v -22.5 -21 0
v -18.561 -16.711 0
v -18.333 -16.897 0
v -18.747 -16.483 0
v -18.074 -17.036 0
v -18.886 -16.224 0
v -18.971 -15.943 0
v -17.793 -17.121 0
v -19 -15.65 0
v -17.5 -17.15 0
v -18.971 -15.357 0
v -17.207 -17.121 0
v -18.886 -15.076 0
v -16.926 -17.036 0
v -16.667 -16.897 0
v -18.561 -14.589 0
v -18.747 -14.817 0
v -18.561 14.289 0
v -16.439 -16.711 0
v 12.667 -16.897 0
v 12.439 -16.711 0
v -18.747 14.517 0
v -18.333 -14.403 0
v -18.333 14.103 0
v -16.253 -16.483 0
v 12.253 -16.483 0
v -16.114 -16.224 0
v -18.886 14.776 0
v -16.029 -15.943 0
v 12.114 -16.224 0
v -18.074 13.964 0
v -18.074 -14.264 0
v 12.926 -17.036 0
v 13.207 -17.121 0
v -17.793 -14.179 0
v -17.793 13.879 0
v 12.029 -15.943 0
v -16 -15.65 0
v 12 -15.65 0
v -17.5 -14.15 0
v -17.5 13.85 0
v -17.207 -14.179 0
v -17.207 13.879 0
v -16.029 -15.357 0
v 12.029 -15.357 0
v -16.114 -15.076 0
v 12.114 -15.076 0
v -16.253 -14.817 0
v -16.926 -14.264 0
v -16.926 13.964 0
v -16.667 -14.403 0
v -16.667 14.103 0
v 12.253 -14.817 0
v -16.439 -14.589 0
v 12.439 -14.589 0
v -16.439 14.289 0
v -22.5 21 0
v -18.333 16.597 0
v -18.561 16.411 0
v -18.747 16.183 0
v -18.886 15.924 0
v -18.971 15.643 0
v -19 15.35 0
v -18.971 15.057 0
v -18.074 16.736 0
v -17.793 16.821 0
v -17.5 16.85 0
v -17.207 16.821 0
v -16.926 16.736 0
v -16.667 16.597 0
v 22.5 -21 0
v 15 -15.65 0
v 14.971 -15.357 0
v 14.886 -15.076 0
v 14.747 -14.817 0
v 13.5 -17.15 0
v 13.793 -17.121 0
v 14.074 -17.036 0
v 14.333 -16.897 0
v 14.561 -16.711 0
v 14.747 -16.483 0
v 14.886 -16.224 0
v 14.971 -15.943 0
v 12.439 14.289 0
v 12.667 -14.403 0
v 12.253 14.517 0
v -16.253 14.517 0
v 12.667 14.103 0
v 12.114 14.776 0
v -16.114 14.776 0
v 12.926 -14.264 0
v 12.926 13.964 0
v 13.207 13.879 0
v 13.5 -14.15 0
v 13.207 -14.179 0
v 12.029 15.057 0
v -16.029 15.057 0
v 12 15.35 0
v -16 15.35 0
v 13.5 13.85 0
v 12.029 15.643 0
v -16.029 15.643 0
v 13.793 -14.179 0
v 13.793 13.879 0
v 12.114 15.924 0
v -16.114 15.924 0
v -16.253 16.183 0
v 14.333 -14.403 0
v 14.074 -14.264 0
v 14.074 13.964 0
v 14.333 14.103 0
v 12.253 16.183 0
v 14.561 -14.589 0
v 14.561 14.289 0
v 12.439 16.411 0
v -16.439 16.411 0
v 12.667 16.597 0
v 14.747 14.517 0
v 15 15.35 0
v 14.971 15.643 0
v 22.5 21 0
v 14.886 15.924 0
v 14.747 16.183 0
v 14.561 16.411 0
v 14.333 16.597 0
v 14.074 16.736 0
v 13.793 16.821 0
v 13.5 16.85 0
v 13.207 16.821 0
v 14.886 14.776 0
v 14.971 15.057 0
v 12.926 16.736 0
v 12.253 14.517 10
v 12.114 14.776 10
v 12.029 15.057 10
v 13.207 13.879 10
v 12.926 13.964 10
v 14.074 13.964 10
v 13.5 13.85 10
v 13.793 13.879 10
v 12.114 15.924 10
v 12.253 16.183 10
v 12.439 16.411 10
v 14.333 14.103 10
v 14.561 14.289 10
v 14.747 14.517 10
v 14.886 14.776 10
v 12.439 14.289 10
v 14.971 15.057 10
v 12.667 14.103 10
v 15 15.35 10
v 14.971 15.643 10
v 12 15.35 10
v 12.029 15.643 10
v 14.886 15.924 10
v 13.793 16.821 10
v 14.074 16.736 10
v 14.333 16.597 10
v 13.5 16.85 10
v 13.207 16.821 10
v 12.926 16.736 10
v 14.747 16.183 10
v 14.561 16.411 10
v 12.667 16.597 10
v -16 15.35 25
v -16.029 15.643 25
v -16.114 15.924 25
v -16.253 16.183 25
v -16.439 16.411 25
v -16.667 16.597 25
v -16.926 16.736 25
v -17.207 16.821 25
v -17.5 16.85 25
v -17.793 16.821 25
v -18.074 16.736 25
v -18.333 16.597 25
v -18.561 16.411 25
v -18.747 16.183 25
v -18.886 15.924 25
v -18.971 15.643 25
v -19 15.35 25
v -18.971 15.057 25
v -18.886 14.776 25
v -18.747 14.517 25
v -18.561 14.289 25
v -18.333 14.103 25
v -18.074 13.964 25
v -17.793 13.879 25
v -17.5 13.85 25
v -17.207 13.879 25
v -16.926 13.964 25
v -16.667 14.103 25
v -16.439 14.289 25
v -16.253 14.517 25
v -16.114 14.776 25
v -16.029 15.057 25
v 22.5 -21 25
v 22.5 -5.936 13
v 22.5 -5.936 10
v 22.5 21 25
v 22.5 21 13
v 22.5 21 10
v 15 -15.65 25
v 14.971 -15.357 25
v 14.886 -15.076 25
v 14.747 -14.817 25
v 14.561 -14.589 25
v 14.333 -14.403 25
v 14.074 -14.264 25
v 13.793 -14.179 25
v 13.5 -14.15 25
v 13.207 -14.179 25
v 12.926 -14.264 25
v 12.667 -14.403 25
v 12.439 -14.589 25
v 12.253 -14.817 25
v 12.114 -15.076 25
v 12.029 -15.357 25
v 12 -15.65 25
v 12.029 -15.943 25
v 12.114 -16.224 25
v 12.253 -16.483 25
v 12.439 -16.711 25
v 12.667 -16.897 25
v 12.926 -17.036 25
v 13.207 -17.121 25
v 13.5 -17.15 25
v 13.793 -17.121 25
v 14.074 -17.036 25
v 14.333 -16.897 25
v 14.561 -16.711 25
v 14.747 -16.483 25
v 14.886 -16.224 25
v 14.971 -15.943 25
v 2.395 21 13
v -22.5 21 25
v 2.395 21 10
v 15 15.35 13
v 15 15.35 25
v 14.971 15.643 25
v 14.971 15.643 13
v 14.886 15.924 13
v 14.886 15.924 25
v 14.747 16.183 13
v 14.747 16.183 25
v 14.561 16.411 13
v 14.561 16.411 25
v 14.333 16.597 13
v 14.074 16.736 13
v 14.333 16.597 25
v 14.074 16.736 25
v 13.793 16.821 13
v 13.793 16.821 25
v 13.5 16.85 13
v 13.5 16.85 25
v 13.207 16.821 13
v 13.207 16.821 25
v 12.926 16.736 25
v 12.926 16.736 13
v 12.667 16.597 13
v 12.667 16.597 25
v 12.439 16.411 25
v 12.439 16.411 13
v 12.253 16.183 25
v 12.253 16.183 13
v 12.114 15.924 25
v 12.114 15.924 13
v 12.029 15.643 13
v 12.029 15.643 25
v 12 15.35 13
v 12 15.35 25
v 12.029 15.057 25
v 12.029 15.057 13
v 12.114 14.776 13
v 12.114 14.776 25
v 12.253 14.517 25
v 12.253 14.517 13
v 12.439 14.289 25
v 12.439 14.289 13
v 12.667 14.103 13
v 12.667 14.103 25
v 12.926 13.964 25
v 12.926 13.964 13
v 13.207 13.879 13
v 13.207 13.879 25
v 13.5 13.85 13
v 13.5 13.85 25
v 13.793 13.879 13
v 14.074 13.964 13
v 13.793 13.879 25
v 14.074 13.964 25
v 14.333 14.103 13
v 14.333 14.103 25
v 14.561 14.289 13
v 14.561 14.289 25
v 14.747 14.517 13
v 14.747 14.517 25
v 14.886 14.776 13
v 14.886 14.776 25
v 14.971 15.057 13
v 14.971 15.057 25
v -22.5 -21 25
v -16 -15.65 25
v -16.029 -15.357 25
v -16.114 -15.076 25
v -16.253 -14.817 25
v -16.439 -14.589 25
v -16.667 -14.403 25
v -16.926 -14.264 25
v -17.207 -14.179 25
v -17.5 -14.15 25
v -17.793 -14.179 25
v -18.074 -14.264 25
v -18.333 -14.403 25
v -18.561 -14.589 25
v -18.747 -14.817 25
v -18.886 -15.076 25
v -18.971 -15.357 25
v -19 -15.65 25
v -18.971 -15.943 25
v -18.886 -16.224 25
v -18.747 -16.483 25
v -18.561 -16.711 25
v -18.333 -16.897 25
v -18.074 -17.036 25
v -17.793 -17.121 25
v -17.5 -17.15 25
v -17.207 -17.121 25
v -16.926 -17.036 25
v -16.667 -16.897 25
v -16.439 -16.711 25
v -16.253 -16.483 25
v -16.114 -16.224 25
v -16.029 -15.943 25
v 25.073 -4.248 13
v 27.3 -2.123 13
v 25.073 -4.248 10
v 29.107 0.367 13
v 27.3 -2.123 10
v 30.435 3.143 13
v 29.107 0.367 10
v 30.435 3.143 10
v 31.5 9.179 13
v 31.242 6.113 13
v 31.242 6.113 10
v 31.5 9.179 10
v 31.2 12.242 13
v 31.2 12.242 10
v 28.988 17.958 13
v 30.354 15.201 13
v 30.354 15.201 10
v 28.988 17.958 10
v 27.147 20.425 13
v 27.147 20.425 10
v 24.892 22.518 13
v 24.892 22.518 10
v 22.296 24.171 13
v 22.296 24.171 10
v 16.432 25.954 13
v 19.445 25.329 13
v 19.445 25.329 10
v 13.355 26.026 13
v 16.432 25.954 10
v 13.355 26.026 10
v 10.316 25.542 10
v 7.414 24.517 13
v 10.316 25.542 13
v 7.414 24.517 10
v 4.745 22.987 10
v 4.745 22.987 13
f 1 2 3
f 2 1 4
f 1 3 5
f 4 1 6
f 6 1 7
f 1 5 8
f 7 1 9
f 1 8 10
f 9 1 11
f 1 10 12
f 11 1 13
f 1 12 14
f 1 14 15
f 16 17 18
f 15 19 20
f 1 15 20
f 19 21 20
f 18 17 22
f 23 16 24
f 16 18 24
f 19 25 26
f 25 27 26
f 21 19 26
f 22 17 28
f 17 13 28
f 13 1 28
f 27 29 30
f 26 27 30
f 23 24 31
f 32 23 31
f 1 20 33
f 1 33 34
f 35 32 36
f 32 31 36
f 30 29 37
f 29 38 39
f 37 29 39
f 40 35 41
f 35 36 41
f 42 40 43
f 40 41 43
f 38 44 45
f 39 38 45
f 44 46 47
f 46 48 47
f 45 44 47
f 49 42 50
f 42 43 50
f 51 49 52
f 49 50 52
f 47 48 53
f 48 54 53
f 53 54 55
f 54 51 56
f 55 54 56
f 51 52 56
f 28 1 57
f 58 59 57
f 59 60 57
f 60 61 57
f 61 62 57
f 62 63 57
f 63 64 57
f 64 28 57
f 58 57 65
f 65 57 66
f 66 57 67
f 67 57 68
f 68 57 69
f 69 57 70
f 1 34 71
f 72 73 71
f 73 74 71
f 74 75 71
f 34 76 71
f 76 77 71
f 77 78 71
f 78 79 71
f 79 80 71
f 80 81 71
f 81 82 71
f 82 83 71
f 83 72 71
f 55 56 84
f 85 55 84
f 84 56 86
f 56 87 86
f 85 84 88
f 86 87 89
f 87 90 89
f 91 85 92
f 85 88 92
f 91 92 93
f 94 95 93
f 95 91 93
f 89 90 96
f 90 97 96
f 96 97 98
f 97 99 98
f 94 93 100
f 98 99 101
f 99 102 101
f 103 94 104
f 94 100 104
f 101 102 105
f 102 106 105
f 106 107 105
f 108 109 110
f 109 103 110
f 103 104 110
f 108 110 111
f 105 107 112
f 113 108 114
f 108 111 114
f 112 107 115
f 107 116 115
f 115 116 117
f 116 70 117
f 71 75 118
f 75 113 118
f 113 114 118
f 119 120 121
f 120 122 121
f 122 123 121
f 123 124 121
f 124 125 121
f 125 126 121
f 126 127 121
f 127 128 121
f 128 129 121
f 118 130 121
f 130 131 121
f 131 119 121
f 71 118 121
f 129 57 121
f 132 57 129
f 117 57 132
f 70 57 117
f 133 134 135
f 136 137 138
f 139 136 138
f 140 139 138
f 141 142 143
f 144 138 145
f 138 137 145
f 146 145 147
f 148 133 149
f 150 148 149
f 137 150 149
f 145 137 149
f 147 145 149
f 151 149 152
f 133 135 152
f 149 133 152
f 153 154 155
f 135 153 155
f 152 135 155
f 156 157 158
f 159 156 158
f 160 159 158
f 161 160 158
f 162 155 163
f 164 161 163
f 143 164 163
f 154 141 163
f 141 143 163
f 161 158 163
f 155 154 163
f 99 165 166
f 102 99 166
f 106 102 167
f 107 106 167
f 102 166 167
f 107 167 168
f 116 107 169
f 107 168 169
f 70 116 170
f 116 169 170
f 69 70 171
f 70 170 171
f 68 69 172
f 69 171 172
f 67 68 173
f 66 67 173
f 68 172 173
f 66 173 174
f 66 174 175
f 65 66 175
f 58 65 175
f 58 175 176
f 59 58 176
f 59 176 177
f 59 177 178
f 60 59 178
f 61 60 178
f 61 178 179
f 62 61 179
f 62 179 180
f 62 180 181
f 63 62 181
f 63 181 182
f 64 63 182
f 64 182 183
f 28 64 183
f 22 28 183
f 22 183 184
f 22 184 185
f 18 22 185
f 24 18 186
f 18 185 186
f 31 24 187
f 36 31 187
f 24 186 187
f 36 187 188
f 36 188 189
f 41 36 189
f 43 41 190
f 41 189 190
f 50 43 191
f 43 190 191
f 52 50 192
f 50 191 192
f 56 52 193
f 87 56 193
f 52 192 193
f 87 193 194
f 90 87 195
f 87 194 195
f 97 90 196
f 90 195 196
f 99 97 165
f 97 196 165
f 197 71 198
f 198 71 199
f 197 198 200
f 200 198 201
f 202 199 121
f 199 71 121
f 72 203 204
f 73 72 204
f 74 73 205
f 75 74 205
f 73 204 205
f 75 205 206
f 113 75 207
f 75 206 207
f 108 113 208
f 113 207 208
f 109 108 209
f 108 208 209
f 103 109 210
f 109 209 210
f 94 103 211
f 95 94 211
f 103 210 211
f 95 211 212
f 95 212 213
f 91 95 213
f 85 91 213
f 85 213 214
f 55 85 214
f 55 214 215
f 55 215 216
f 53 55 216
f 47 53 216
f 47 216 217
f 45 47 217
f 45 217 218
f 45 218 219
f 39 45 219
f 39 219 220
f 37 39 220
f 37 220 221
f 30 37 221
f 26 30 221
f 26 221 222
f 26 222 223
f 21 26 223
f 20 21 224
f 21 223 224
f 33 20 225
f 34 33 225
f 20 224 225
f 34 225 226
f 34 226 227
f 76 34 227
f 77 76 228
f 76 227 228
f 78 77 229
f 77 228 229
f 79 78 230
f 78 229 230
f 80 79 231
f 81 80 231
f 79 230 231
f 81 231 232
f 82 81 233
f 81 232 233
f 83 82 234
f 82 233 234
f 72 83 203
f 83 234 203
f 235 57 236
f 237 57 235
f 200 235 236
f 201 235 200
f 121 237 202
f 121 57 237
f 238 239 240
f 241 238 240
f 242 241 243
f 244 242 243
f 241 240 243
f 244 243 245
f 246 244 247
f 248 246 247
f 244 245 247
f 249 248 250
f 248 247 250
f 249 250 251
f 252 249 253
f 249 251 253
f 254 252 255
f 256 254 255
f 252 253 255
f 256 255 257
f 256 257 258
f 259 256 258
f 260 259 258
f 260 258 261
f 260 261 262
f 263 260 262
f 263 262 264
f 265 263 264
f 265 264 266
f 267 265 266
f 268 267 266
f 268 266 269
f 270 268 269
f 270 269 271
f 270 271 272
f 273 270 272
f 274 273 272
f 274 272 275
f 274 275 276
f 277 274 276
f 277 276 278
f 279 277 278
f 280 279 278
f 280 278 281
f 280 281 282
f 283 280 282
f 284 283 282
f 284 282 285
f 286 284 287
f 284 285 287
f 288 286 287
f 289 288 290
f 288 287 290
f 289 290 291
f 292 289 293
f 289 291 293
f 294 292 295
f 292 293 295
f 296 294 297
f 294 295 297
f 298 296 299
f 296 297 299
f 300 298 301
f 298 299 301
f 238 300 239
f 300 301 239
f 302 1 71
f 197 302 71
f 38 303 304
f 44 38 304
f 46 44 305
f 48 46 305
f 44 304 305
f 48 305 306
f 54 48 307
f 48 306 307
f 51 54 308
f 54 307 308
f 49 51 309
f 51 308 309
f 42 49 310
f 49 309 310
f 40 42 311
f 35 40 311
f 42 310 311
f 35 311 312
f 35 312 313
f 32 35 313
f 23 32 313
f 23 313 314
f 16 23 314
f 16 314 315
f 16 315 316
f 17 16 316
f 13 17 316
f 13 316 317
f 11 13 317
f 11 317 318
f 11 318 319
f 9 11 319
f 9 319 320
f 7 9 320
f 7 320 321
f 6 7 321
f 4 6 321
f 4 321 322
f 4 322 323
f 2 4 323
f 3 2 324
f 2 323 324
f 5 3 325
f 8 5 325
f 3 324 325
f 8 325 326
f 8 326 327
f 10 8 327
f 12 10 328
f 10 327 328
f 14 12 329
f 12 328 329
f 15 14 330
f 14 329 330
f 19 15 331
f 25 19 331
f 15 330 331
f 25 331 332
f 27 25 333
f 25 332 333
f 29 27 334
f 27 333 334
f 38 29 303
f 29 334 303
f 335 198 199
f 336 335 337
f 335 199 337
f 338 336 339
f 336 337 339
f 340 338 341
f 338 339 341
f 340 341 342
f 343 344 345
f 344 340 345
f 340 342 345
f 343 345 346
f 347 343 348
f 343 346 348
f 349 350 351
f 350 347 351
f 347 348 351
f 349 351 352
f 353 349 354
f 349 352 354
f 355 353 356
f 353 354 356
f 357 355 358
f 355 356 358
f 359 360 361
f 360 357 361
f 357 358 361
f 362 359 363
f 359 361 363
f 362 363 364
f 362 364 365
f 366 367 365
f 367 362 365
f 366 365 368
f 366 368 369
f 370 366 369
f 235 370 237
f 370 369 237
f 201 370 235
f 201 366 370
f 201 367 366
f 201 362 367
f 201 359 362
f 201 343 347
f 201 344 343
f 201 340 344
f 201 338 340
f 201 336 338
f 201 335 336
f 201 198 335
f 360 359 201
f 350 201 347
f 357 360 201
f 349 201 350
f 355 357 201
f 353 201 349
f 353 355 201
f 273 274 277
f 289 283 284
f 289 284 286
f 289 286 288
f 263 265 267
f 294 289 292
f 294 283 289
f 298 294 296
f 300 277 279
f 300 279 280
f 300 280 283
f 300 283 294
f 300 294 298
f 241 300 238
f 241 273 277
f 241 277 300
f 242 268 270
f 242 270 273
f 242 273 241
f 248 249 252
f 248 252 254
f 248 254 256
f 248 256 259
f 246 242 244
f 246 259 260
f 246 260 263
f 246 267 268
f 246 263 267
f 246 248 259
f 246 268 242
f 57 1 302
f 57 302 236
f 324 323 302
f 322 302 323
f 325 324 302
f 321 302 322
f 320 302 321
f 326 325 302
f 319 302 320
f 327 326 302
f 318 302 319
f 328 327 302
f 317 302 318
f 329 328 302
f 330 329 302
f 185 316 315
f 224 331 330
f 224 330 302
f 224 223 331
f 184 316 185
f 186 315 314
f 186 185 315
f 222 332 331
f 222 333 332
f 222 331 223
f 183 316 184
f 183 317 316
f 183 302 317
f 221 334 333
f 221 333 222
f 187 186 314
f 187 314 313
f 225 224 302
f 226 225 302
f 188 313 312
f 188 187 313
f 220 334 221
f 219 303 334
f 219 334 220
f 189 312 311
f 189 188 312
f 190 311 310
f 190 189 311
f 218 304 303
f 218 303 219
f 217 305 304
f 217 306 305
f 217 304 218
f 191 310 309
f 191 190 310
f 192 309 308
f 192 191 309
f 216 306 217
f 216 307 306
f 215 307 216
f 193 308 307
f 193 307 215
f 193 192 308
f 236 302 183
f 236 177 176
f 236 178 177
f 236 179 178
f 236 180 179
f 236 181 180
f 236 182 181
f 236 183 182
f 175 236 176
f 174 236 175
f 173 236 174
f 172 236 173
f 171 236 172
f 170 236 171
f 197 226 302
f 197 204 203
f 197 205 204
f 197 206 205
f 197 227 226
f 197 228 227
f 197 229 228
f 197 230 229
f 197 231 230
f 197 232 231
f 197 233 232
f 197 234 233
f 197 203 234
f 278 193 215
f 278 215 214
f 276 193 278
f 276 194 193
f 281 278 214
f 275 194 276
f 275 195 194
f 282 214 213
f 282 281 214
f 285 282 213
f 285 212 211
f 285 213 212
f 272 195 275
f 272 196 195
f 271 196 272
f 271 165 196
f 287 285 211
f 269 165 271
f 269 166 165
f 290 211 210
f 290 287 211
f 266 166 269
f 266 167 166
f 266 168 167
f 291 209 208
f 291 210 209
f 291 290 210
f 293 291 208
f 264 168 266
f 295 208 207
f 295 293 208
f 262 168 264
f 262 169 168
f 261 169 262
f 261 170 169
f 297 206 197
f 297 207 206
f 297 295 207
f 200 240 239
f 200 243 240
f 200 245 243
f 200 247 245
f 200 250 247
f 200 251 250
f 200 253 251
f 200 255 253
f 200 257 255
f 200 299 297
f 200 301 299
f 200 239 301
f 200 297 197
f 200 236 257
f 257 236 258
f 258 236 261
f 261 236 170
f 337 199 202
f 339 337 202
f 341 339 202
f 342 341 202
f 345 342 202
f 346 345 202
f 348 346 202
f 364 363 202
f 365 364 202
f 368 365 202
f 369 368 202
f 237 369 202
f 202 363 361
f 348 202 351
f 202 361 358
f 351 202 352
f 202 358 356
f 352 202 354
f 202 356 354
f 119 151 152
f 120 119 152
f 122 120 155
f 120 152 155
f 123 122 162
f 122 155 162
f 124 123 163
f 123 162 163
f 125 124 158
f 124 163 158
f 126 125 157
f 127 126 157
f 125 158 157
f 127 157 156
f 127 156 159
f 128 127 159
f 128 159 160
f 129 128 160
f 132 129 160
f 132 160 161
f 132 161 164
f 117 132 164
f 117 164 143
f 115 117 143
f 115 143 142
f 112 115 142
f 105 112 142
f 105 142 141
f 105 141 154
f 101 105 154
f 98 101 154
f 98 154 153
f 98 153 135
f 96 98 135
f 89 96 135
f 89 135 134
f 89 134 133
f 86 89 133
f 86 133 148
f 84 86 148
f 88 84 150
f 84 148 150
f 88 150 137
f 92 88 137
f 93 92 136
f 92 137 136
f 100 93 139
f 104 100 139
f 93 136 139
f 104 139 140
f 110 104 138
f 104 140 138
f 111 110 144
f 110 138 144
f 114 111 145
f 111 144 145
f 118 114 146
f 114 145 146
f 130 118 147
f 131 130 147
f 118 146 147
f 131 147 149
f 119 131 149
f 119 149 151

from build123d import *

# Parameters (mm, degrees)
SKETCH1_W           = 45
SKETCH1_H           = 42
BOSS_EXTRUDE1_DEPTH = 25
SKETCH2_R           = 1.5
CUT_EXTRUDE1_DEPTH  = 26
SKETCH3_R           = 17
BOSS_EXTRUDE2_DEPTH = 3


with BuildPart() as part:
    # Sketch1 → Boss-Extrude1 (new body)
    with BuildSketch(Plane.XY):
        Rectangle(SKETCH1_W, SKETCH1_H)
    extrude(amount=BOSS_EXTRUDE1_DEPTH)

    # Sketch2 → Cut-Extrude1 (cut, through all)
    with BuildSketch(Plane.XY.offset(25)):
        with Locations((13.5, 15.35)):
            Circle(SKETCH2_R)
        with Locations((-17.5, 15.35)):
            Circle(SKETCH2_R)
        with Locations((-17.5, -15.65)):
            Circle(SKETCH2_R)
        with Locations((13.5, -15.65)):
            Circle(SKETCH2_R)
    extrude(amount=-CUT_EXTRUDE1_DEPTH, mode=Mode.SUBTRACT)

    # Sketch3 → Boss-Extrude2 (add)
    with BuildSketch(Plane.XY.offset(10)):
        with Locations((14.5, 9.06439174)):
            Circle(SKETCH3_R)
    extrude(amount=BOSS_EXTRUDE2_DEPTH)


solid = part.part
